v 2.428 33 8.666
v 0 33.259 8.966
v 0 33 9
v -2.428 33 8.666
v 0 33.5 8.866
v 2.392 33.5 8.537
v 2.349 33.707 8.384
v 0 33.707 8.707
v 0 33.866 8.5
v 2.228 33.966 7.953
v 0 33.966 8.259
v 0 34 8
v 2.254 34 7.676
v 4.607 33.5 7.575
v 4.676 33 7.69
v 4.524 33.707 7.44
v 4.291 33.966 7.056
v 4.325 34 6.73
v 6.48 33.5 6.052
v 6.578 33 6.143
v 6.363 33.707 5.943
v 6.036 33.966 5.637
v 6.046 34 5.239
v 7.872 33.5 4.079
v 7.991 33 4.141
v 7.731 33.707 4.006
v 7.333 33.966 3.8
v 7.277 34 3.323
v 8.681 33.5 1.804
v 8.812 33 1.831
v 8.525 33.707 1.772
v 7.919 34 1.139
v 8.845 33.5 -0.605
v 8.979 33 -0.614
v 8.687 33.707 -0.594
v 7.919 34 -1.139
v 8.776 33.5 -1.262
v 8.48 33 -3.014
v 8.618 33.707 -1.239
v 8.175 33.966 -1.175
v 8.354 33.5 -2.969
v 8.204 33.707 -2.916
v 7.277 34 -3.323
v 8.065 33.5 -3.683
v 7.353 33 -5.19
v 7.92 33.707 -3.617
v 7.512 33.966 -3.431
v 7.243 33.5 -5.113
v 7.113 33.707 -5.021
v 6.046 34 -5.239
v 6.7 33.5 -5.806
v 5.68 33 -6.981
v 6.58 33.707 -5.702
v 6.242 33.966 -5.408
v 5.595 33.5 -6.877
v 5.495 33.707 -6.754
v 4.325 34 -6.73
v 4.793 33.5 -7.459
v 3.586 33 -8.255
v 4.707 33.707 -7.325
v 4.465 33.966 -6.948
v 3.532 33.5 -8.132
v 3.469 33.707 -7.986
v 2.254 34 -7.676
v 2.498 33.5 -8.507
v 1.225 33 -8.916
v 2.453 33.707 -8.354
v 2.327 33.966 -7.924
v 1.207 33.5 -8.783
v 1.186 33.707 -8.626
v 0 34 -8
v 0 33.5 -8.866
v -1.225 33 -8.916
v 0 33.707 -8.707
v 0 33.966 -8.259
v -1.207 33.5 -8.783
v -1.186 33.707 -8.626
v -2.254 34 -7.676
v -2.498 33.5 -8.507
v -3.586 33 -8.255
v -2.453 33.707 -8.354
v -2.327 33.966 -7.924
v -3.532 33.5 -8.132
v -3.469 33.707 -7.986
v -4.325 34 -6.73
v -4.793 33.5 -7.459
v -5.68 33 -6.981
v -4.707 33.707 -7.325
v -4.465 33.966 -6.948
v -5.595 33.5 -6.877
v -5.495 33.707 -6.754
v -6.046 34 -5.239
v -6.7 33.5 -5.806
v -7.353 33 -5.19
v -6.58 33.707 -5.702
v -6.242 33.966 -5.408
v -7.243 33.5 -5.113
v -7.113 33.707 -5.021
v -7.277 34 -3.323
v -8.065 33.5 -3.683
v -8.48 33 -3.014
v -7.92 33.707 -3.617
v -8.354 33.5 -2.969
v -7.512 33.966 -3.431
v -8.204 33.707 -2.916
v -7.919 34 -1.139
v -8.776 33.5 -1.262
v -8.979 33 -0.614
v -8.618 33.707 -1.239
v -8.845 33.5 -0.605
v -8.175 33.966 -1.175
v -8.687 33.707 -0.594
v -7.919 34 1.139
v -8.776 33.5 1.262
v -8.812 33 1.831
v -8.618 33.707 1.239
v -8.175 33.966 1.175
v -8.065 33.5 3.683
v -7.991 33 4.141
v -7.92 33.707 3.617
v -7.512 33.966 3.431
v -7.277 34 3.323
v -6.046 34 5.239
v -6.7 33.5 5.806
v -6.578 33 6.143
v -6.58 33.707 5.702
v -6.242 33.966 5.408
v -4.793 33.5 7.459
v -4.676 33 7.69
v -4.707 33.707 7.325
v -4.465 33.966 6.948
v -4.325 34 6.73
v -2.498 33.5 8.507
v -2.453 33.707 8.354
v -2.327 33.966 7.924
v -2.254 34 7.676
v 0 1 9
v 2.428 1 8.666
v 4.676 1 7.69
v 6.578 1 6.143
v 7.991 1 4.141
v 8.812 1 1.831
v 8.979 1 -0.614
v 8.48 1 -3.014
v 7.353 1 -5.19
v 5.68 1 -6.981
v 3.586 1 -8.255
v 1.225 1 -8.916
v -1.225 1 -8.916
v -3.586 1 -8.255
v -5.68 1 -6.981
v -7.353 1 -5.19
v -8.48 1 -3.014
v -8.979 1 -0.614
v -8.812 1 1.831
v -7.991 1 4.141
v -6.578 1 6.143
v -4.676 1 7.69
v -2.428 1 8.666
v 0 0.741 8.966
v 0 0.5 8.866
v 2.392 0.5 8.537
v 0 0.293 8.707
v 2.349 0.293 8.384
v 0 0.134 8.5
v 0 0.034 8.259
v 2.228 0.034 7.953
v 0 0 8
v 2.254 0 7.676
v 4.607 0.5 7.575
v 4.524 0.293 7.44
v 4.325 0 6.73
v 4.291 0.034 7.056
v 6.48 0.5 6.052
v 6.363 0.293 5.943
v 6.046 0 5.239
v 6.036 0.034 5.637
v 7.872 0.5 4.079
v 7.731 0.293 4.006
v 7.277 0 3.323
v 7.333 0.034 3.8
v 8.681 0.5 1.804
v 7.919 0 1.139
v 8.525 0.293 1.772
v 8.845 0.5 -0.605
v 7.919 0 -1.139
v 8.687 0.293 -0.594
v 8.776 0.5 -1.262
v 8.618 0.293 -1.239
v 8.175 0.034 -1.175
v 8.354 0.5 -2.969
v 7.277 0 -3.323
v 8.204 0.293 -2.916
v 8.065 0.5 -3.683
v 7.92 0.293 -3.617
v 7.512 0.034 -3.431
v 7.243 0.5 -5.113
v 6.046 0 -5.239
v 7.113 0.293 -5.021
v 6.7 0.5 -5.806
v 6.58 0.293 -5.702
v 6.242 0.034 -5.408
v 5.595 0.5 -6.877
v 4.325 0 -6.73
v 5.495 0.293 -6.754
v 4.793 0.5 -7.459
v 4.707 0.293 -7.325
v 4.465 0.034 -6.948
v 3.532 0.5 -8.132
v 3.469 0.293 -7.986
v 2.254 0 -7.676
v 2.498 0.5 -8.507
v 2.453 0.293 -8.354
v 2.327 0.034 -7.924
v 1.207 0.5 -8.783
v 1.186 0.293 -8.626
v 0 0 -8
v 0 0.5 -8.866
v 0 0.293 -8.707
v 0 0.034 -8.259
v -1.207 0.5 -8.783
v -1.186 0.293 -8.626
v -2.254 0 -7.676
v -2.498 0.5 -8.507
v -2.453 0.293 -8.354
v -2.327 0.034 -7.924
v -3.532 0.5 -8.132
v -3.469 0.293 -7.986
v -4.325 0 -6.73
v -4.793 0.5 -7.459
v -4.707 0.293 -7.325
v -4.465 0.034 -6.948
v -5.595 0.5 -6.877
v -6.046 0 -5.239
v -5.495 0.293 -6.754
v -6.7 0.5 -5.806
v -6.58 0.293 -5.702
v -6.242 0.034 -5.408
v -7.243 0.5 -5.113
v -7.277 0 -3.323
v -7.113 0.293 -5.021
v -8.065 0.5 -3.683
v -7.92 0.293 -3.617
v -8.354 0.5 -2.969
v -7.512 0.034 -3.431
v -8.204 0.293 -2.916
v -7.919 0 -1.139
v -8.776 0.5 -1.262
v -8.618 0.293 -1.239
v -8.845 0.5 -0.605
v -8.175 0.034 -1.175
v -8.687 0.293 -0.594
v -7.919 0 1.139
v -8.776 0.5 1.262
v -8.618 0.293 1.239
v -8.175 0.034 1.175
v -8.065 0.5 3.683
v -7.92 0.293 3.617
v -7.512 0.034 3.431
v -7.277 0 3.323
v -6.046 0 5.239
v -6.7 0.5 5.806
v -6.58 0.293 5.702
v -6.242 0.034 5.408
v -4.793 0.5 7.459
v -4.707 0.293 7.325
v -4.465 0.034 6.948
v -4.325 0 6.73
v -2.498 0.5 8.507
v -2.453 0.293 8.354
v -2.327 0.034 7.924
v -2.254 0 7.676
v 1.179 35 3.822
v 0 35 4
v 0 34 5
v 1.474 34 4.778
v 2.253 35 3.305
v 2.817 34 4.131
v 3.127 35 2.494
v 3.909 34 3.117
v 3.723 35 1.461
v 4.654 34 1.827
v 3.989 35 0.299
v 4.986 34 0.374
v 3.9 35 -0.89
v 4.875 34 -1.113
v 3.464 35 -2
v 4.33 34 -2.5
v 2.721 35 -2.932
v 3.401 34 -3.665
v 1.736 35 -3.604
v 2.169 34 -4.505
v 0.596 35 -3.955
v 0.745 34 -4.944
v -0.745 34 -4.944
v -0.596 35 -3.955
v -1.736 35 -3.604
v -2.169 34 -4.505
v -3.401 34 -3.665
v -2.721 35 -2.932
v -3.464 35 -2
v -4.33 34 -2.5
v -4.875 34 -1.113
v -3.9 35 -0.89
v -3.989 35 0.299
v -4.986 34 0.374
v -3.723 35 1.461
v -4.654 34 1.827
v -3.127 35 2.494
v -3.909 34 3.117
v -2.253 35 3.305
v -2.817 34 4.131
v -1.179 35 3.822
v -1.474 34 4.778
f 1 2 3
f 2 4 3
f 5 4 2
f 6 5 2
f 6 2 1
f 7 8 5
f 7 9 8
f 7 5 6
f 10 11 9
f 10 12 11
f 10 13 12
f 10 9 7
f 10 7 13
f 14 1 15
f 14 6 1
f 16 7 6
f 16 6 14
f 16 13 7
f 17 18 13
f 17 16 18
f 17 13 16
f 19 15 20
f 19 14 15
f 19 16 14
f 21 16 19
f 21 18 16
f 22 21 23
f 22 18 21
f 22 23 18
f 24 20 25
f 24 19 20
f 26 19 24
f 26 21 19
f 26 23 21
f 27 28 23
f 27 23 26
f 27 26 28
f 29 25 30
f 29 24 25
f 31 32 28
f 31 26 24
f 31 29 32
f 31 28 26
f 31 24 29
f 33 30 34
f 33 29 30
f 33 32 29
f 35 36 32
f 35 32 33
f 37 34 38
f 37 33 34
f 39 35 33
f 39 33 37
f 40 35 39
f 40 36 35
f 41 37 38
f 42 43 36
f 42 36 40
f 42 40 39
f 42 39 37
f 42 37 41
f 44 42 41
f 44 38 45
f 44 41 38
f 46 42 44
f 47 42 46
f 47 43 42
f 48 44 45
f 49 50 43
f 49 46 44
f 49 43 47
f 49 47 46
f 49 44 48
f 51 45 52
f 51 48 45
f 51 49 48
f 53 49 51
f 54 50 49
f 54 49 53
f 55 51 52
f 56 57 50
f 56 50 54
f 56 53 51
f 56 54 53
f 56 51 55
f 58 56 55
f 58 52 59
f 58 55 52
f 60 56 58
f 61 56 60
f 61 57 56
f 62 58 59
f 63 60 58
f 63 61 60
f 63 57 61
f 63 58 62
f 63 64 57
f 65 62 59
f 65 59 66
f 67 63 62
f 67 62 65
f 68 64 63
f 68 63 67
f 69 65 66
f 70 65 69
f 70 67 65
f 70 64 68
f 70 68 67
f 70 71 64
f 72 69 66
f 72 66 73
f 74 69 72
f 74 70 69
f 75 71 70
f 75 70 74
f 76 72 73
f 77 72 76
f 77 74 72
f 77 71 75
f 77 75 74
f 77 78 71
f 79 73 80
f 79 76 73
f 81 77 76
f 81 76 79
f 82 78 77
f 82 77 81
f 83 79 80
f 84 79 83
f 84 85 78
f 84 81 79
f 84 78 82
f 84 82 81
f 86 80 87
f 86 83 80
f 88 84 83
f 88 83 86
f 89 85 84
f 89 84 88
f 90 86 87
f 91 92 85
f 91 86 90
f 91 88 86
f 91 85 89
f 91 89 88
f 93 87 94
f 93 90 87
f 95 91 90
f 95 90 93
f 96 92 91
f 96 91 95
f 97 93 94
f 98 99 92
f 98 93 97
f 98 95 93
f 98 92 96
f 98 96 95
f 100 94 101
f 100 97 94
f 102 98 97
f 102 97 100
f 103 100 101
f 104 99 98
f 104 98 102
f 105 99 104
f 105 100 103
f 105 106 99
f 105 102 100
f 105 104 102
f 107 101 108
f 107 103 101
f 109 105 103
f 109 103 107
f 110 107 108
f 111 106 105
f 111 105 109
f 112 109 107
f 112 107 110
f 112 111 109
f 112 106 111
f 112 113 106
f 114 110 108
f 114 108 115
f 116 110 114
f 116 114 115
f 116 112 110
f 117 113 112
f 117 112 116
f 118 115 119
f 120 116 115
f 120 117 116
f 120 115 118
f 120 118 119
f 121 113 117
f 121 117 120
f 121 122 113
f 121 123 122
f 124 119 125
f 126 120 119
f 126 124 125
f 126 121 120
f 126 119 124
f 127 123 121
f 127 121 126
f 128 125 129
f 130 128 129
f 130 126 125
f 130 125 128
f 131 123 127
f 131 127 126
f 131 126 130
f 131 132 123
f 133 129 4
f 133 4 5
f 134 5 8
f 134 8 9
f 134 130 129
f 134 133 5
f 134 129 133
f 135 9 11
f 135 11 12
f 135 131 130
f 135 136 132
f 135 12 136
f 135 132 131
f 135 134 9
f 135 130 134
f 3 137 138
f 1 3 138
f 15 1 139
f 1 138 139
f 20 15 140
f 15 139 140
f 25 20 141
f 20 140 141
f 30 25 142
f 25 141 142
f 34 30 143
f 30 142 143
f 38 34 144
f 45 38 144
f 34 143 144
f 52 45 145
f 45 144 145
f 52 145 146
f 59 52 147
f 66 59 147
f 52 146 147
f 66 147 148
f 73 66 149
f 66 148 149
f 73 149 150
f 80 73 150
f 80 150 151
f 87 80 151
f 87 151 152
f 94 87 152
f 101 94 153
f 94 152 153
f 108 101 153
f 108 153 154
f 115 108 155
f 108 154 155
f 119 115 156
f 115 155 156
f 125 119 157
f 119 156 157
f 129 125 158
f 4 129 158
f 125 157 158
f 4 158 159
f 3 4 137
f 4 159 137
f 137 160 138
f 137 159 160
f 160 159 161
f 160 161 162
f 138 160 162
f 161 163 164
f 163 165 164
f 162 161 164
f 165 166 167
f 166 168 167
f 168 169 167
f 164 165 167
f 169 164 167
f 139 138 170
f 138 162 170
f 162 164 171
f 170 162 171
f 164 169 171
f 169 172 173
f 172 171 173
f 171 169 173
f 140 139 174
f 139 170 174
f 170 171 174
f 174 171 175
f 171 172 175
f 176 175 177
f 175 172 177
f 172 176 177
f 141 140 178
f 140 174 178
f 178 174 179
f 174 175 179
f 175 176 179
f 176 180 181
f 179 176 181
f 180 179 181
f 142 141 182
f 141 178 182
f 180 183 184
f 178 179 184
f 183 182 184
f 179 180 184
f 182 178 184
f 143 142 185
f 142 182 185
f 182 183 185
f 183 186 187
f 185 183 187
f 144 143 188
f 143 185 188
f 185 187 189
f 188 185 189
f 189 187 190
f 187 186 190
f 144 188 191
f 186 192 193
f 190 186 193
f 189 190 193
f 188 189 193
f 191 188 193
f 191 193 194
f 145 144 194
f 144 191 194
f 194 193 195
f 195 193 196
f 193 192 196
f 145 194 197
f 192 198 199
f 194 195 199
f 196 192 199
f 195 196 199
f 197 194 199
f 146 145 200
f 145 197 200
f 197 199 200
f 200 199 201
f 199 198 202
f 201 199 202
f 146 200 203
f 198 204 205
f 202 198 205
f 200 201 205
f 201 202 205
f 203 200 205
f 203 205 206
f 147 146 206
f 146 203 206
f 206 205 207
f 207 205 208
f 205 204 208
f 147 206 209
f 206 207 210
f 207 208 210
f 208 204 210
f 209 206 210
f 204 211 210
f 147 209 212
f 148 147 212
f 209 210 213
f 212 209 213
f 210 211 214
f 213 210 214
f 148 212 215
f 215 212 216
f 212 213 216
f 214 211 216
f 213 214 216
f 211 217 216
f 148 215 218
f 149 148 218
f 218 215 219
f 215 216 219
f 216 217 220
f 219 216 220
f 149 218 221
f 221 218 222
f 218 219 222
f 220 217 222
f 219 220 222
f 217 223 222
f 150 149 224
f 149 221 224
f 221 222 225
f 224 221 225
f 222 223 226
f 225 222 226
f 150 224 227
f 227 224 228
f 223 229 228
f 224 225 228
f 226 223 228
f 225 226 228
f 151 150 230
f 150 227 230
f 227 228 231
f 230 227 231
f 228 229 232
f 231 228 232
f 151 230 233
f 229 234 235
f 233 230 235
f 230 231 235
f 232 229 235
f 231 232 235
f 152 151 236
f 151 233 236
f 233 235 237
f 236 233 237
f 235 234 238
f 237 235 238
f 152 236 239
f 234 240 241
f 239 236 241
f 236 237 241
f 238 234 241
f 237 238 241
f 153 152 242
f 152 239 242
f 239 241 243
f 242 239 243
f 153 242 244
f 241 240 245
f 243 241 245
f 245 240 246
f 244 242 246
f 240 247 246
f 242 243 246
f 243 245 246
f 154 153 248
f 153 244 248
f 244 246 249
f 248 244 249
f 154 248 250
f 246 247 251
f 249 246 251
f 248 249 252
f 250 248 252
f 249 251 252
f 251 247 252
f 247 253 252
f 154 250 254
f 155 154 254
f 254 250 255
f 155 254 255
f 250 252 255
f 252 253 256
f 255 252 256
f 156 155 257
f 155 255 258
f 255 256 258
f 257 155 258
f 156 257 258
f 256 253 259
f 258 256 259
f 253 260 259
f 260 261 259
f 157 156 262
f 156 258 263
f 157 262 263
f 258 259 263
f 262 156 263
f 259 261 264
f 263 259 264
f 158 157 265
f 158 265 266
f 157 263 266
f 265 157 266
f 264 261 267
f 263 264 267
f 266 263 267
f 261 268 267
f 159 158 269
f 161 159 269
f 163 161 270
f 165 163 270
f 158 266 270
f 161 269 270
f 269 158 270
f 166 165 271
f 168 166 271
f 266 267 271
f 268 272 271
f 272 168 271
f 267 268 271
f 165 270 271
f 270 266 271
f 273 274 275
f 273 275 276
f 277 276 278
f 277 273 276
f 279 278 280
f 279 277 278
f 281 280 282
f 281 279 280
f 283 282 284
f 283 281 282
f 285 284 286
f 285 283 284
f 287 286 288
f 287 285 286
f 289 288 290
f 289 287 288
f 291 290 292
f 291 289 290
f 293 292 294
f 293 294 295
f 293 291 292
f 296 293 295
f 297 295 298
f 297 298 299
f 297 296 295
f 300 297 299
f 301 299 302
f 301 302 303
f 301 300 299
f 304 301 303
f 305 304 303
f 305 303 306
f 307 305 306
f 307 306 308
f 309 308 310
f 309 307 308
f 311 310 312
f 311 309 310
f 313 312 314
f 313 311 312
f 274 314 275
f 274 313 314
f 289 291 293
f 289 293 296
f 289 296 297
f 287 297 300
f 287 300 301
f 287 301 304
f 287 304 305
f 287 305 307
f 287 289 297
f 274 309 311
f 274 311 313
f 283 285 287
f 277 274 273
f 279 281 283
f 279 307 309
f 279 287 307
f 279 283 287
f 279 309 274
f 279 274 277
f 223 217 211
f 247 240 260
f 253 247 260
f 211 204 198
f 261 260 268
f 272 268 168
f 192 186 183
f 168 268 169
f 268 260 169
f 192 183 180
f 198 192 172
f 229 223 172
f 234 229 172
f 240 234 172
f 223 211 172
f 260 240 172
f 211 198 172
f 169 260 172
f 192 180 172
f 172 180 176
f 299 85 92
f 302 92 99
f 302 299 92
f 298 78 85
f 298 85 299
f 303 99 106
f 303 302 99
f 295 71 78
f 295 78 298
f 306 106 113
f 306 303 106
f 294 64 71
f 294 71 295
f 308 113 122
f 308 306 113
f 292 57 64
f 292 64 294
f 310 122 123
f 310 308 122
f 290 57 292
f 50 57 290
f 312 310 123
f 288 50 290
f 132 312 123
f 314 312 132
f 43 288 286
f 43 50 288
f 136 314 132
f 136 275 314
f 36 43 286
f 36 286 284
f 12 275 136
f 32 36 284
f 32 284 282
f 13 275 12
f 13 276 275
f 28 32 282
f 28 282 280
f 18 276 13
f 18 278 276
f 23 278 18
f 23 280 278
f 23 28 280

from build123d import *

# Parameters (mm, degrees)
SKETCH1_R           = 9
BOSS_EXTRUDE1_DEPTH = 34
SKETCH2_R           = 4
BOSS_EXTRUDE2_DEPTH = 1
FILLET1_R           = 1
CHAMFER1_SIZE       = 1


with BuildPart() as part:
    # Sketch1 → Boss-Extrude1 (new body)
    with BuildSketch(Plane(origin=(0, 0, 0), x_dir=(1, 0, 0), z_dir=(0, 1, 0))):
        with Locations(Location((0, 0, 0), (0, 0, 270))):
            Circle(SKETCH1_R)
    extrude(amount=BOSS_EXTRUDE1_DEPTH)

    # Sketch2 → Boss-Extrude2 (add)
    with BuildSketch(Plane(origin=(0, 34, 0), x_dir=(1, 0, 0), z_dir=(0, 1, 0))):
        with Locations(Location((0, 0, 0), (0, 0, 270))):
            Circle(SKETCH2_R)
    extrude(amount=BOSS_EXTRUDE2_DEPTH)

    # Fillet1
    fillet1_edges = [part.edges().sort_by_distance(p)[0] for p in [
        (0, 0, -9),
        (0, 34, -9),
    ]]
    fillet(fillet1_edges, radius=FILLET1_R)

    # Chamfer1
    chamfer1_edges = [part.edges().sort_by_distance(p)[0] for p in [
        (0, 34, -4),
    ]]
    chamfer(chamfer1_edges, length=CHAMFER1_SIZE - 0.0001)  # a hair under: the kernel refuses the full size


solid = part.part
